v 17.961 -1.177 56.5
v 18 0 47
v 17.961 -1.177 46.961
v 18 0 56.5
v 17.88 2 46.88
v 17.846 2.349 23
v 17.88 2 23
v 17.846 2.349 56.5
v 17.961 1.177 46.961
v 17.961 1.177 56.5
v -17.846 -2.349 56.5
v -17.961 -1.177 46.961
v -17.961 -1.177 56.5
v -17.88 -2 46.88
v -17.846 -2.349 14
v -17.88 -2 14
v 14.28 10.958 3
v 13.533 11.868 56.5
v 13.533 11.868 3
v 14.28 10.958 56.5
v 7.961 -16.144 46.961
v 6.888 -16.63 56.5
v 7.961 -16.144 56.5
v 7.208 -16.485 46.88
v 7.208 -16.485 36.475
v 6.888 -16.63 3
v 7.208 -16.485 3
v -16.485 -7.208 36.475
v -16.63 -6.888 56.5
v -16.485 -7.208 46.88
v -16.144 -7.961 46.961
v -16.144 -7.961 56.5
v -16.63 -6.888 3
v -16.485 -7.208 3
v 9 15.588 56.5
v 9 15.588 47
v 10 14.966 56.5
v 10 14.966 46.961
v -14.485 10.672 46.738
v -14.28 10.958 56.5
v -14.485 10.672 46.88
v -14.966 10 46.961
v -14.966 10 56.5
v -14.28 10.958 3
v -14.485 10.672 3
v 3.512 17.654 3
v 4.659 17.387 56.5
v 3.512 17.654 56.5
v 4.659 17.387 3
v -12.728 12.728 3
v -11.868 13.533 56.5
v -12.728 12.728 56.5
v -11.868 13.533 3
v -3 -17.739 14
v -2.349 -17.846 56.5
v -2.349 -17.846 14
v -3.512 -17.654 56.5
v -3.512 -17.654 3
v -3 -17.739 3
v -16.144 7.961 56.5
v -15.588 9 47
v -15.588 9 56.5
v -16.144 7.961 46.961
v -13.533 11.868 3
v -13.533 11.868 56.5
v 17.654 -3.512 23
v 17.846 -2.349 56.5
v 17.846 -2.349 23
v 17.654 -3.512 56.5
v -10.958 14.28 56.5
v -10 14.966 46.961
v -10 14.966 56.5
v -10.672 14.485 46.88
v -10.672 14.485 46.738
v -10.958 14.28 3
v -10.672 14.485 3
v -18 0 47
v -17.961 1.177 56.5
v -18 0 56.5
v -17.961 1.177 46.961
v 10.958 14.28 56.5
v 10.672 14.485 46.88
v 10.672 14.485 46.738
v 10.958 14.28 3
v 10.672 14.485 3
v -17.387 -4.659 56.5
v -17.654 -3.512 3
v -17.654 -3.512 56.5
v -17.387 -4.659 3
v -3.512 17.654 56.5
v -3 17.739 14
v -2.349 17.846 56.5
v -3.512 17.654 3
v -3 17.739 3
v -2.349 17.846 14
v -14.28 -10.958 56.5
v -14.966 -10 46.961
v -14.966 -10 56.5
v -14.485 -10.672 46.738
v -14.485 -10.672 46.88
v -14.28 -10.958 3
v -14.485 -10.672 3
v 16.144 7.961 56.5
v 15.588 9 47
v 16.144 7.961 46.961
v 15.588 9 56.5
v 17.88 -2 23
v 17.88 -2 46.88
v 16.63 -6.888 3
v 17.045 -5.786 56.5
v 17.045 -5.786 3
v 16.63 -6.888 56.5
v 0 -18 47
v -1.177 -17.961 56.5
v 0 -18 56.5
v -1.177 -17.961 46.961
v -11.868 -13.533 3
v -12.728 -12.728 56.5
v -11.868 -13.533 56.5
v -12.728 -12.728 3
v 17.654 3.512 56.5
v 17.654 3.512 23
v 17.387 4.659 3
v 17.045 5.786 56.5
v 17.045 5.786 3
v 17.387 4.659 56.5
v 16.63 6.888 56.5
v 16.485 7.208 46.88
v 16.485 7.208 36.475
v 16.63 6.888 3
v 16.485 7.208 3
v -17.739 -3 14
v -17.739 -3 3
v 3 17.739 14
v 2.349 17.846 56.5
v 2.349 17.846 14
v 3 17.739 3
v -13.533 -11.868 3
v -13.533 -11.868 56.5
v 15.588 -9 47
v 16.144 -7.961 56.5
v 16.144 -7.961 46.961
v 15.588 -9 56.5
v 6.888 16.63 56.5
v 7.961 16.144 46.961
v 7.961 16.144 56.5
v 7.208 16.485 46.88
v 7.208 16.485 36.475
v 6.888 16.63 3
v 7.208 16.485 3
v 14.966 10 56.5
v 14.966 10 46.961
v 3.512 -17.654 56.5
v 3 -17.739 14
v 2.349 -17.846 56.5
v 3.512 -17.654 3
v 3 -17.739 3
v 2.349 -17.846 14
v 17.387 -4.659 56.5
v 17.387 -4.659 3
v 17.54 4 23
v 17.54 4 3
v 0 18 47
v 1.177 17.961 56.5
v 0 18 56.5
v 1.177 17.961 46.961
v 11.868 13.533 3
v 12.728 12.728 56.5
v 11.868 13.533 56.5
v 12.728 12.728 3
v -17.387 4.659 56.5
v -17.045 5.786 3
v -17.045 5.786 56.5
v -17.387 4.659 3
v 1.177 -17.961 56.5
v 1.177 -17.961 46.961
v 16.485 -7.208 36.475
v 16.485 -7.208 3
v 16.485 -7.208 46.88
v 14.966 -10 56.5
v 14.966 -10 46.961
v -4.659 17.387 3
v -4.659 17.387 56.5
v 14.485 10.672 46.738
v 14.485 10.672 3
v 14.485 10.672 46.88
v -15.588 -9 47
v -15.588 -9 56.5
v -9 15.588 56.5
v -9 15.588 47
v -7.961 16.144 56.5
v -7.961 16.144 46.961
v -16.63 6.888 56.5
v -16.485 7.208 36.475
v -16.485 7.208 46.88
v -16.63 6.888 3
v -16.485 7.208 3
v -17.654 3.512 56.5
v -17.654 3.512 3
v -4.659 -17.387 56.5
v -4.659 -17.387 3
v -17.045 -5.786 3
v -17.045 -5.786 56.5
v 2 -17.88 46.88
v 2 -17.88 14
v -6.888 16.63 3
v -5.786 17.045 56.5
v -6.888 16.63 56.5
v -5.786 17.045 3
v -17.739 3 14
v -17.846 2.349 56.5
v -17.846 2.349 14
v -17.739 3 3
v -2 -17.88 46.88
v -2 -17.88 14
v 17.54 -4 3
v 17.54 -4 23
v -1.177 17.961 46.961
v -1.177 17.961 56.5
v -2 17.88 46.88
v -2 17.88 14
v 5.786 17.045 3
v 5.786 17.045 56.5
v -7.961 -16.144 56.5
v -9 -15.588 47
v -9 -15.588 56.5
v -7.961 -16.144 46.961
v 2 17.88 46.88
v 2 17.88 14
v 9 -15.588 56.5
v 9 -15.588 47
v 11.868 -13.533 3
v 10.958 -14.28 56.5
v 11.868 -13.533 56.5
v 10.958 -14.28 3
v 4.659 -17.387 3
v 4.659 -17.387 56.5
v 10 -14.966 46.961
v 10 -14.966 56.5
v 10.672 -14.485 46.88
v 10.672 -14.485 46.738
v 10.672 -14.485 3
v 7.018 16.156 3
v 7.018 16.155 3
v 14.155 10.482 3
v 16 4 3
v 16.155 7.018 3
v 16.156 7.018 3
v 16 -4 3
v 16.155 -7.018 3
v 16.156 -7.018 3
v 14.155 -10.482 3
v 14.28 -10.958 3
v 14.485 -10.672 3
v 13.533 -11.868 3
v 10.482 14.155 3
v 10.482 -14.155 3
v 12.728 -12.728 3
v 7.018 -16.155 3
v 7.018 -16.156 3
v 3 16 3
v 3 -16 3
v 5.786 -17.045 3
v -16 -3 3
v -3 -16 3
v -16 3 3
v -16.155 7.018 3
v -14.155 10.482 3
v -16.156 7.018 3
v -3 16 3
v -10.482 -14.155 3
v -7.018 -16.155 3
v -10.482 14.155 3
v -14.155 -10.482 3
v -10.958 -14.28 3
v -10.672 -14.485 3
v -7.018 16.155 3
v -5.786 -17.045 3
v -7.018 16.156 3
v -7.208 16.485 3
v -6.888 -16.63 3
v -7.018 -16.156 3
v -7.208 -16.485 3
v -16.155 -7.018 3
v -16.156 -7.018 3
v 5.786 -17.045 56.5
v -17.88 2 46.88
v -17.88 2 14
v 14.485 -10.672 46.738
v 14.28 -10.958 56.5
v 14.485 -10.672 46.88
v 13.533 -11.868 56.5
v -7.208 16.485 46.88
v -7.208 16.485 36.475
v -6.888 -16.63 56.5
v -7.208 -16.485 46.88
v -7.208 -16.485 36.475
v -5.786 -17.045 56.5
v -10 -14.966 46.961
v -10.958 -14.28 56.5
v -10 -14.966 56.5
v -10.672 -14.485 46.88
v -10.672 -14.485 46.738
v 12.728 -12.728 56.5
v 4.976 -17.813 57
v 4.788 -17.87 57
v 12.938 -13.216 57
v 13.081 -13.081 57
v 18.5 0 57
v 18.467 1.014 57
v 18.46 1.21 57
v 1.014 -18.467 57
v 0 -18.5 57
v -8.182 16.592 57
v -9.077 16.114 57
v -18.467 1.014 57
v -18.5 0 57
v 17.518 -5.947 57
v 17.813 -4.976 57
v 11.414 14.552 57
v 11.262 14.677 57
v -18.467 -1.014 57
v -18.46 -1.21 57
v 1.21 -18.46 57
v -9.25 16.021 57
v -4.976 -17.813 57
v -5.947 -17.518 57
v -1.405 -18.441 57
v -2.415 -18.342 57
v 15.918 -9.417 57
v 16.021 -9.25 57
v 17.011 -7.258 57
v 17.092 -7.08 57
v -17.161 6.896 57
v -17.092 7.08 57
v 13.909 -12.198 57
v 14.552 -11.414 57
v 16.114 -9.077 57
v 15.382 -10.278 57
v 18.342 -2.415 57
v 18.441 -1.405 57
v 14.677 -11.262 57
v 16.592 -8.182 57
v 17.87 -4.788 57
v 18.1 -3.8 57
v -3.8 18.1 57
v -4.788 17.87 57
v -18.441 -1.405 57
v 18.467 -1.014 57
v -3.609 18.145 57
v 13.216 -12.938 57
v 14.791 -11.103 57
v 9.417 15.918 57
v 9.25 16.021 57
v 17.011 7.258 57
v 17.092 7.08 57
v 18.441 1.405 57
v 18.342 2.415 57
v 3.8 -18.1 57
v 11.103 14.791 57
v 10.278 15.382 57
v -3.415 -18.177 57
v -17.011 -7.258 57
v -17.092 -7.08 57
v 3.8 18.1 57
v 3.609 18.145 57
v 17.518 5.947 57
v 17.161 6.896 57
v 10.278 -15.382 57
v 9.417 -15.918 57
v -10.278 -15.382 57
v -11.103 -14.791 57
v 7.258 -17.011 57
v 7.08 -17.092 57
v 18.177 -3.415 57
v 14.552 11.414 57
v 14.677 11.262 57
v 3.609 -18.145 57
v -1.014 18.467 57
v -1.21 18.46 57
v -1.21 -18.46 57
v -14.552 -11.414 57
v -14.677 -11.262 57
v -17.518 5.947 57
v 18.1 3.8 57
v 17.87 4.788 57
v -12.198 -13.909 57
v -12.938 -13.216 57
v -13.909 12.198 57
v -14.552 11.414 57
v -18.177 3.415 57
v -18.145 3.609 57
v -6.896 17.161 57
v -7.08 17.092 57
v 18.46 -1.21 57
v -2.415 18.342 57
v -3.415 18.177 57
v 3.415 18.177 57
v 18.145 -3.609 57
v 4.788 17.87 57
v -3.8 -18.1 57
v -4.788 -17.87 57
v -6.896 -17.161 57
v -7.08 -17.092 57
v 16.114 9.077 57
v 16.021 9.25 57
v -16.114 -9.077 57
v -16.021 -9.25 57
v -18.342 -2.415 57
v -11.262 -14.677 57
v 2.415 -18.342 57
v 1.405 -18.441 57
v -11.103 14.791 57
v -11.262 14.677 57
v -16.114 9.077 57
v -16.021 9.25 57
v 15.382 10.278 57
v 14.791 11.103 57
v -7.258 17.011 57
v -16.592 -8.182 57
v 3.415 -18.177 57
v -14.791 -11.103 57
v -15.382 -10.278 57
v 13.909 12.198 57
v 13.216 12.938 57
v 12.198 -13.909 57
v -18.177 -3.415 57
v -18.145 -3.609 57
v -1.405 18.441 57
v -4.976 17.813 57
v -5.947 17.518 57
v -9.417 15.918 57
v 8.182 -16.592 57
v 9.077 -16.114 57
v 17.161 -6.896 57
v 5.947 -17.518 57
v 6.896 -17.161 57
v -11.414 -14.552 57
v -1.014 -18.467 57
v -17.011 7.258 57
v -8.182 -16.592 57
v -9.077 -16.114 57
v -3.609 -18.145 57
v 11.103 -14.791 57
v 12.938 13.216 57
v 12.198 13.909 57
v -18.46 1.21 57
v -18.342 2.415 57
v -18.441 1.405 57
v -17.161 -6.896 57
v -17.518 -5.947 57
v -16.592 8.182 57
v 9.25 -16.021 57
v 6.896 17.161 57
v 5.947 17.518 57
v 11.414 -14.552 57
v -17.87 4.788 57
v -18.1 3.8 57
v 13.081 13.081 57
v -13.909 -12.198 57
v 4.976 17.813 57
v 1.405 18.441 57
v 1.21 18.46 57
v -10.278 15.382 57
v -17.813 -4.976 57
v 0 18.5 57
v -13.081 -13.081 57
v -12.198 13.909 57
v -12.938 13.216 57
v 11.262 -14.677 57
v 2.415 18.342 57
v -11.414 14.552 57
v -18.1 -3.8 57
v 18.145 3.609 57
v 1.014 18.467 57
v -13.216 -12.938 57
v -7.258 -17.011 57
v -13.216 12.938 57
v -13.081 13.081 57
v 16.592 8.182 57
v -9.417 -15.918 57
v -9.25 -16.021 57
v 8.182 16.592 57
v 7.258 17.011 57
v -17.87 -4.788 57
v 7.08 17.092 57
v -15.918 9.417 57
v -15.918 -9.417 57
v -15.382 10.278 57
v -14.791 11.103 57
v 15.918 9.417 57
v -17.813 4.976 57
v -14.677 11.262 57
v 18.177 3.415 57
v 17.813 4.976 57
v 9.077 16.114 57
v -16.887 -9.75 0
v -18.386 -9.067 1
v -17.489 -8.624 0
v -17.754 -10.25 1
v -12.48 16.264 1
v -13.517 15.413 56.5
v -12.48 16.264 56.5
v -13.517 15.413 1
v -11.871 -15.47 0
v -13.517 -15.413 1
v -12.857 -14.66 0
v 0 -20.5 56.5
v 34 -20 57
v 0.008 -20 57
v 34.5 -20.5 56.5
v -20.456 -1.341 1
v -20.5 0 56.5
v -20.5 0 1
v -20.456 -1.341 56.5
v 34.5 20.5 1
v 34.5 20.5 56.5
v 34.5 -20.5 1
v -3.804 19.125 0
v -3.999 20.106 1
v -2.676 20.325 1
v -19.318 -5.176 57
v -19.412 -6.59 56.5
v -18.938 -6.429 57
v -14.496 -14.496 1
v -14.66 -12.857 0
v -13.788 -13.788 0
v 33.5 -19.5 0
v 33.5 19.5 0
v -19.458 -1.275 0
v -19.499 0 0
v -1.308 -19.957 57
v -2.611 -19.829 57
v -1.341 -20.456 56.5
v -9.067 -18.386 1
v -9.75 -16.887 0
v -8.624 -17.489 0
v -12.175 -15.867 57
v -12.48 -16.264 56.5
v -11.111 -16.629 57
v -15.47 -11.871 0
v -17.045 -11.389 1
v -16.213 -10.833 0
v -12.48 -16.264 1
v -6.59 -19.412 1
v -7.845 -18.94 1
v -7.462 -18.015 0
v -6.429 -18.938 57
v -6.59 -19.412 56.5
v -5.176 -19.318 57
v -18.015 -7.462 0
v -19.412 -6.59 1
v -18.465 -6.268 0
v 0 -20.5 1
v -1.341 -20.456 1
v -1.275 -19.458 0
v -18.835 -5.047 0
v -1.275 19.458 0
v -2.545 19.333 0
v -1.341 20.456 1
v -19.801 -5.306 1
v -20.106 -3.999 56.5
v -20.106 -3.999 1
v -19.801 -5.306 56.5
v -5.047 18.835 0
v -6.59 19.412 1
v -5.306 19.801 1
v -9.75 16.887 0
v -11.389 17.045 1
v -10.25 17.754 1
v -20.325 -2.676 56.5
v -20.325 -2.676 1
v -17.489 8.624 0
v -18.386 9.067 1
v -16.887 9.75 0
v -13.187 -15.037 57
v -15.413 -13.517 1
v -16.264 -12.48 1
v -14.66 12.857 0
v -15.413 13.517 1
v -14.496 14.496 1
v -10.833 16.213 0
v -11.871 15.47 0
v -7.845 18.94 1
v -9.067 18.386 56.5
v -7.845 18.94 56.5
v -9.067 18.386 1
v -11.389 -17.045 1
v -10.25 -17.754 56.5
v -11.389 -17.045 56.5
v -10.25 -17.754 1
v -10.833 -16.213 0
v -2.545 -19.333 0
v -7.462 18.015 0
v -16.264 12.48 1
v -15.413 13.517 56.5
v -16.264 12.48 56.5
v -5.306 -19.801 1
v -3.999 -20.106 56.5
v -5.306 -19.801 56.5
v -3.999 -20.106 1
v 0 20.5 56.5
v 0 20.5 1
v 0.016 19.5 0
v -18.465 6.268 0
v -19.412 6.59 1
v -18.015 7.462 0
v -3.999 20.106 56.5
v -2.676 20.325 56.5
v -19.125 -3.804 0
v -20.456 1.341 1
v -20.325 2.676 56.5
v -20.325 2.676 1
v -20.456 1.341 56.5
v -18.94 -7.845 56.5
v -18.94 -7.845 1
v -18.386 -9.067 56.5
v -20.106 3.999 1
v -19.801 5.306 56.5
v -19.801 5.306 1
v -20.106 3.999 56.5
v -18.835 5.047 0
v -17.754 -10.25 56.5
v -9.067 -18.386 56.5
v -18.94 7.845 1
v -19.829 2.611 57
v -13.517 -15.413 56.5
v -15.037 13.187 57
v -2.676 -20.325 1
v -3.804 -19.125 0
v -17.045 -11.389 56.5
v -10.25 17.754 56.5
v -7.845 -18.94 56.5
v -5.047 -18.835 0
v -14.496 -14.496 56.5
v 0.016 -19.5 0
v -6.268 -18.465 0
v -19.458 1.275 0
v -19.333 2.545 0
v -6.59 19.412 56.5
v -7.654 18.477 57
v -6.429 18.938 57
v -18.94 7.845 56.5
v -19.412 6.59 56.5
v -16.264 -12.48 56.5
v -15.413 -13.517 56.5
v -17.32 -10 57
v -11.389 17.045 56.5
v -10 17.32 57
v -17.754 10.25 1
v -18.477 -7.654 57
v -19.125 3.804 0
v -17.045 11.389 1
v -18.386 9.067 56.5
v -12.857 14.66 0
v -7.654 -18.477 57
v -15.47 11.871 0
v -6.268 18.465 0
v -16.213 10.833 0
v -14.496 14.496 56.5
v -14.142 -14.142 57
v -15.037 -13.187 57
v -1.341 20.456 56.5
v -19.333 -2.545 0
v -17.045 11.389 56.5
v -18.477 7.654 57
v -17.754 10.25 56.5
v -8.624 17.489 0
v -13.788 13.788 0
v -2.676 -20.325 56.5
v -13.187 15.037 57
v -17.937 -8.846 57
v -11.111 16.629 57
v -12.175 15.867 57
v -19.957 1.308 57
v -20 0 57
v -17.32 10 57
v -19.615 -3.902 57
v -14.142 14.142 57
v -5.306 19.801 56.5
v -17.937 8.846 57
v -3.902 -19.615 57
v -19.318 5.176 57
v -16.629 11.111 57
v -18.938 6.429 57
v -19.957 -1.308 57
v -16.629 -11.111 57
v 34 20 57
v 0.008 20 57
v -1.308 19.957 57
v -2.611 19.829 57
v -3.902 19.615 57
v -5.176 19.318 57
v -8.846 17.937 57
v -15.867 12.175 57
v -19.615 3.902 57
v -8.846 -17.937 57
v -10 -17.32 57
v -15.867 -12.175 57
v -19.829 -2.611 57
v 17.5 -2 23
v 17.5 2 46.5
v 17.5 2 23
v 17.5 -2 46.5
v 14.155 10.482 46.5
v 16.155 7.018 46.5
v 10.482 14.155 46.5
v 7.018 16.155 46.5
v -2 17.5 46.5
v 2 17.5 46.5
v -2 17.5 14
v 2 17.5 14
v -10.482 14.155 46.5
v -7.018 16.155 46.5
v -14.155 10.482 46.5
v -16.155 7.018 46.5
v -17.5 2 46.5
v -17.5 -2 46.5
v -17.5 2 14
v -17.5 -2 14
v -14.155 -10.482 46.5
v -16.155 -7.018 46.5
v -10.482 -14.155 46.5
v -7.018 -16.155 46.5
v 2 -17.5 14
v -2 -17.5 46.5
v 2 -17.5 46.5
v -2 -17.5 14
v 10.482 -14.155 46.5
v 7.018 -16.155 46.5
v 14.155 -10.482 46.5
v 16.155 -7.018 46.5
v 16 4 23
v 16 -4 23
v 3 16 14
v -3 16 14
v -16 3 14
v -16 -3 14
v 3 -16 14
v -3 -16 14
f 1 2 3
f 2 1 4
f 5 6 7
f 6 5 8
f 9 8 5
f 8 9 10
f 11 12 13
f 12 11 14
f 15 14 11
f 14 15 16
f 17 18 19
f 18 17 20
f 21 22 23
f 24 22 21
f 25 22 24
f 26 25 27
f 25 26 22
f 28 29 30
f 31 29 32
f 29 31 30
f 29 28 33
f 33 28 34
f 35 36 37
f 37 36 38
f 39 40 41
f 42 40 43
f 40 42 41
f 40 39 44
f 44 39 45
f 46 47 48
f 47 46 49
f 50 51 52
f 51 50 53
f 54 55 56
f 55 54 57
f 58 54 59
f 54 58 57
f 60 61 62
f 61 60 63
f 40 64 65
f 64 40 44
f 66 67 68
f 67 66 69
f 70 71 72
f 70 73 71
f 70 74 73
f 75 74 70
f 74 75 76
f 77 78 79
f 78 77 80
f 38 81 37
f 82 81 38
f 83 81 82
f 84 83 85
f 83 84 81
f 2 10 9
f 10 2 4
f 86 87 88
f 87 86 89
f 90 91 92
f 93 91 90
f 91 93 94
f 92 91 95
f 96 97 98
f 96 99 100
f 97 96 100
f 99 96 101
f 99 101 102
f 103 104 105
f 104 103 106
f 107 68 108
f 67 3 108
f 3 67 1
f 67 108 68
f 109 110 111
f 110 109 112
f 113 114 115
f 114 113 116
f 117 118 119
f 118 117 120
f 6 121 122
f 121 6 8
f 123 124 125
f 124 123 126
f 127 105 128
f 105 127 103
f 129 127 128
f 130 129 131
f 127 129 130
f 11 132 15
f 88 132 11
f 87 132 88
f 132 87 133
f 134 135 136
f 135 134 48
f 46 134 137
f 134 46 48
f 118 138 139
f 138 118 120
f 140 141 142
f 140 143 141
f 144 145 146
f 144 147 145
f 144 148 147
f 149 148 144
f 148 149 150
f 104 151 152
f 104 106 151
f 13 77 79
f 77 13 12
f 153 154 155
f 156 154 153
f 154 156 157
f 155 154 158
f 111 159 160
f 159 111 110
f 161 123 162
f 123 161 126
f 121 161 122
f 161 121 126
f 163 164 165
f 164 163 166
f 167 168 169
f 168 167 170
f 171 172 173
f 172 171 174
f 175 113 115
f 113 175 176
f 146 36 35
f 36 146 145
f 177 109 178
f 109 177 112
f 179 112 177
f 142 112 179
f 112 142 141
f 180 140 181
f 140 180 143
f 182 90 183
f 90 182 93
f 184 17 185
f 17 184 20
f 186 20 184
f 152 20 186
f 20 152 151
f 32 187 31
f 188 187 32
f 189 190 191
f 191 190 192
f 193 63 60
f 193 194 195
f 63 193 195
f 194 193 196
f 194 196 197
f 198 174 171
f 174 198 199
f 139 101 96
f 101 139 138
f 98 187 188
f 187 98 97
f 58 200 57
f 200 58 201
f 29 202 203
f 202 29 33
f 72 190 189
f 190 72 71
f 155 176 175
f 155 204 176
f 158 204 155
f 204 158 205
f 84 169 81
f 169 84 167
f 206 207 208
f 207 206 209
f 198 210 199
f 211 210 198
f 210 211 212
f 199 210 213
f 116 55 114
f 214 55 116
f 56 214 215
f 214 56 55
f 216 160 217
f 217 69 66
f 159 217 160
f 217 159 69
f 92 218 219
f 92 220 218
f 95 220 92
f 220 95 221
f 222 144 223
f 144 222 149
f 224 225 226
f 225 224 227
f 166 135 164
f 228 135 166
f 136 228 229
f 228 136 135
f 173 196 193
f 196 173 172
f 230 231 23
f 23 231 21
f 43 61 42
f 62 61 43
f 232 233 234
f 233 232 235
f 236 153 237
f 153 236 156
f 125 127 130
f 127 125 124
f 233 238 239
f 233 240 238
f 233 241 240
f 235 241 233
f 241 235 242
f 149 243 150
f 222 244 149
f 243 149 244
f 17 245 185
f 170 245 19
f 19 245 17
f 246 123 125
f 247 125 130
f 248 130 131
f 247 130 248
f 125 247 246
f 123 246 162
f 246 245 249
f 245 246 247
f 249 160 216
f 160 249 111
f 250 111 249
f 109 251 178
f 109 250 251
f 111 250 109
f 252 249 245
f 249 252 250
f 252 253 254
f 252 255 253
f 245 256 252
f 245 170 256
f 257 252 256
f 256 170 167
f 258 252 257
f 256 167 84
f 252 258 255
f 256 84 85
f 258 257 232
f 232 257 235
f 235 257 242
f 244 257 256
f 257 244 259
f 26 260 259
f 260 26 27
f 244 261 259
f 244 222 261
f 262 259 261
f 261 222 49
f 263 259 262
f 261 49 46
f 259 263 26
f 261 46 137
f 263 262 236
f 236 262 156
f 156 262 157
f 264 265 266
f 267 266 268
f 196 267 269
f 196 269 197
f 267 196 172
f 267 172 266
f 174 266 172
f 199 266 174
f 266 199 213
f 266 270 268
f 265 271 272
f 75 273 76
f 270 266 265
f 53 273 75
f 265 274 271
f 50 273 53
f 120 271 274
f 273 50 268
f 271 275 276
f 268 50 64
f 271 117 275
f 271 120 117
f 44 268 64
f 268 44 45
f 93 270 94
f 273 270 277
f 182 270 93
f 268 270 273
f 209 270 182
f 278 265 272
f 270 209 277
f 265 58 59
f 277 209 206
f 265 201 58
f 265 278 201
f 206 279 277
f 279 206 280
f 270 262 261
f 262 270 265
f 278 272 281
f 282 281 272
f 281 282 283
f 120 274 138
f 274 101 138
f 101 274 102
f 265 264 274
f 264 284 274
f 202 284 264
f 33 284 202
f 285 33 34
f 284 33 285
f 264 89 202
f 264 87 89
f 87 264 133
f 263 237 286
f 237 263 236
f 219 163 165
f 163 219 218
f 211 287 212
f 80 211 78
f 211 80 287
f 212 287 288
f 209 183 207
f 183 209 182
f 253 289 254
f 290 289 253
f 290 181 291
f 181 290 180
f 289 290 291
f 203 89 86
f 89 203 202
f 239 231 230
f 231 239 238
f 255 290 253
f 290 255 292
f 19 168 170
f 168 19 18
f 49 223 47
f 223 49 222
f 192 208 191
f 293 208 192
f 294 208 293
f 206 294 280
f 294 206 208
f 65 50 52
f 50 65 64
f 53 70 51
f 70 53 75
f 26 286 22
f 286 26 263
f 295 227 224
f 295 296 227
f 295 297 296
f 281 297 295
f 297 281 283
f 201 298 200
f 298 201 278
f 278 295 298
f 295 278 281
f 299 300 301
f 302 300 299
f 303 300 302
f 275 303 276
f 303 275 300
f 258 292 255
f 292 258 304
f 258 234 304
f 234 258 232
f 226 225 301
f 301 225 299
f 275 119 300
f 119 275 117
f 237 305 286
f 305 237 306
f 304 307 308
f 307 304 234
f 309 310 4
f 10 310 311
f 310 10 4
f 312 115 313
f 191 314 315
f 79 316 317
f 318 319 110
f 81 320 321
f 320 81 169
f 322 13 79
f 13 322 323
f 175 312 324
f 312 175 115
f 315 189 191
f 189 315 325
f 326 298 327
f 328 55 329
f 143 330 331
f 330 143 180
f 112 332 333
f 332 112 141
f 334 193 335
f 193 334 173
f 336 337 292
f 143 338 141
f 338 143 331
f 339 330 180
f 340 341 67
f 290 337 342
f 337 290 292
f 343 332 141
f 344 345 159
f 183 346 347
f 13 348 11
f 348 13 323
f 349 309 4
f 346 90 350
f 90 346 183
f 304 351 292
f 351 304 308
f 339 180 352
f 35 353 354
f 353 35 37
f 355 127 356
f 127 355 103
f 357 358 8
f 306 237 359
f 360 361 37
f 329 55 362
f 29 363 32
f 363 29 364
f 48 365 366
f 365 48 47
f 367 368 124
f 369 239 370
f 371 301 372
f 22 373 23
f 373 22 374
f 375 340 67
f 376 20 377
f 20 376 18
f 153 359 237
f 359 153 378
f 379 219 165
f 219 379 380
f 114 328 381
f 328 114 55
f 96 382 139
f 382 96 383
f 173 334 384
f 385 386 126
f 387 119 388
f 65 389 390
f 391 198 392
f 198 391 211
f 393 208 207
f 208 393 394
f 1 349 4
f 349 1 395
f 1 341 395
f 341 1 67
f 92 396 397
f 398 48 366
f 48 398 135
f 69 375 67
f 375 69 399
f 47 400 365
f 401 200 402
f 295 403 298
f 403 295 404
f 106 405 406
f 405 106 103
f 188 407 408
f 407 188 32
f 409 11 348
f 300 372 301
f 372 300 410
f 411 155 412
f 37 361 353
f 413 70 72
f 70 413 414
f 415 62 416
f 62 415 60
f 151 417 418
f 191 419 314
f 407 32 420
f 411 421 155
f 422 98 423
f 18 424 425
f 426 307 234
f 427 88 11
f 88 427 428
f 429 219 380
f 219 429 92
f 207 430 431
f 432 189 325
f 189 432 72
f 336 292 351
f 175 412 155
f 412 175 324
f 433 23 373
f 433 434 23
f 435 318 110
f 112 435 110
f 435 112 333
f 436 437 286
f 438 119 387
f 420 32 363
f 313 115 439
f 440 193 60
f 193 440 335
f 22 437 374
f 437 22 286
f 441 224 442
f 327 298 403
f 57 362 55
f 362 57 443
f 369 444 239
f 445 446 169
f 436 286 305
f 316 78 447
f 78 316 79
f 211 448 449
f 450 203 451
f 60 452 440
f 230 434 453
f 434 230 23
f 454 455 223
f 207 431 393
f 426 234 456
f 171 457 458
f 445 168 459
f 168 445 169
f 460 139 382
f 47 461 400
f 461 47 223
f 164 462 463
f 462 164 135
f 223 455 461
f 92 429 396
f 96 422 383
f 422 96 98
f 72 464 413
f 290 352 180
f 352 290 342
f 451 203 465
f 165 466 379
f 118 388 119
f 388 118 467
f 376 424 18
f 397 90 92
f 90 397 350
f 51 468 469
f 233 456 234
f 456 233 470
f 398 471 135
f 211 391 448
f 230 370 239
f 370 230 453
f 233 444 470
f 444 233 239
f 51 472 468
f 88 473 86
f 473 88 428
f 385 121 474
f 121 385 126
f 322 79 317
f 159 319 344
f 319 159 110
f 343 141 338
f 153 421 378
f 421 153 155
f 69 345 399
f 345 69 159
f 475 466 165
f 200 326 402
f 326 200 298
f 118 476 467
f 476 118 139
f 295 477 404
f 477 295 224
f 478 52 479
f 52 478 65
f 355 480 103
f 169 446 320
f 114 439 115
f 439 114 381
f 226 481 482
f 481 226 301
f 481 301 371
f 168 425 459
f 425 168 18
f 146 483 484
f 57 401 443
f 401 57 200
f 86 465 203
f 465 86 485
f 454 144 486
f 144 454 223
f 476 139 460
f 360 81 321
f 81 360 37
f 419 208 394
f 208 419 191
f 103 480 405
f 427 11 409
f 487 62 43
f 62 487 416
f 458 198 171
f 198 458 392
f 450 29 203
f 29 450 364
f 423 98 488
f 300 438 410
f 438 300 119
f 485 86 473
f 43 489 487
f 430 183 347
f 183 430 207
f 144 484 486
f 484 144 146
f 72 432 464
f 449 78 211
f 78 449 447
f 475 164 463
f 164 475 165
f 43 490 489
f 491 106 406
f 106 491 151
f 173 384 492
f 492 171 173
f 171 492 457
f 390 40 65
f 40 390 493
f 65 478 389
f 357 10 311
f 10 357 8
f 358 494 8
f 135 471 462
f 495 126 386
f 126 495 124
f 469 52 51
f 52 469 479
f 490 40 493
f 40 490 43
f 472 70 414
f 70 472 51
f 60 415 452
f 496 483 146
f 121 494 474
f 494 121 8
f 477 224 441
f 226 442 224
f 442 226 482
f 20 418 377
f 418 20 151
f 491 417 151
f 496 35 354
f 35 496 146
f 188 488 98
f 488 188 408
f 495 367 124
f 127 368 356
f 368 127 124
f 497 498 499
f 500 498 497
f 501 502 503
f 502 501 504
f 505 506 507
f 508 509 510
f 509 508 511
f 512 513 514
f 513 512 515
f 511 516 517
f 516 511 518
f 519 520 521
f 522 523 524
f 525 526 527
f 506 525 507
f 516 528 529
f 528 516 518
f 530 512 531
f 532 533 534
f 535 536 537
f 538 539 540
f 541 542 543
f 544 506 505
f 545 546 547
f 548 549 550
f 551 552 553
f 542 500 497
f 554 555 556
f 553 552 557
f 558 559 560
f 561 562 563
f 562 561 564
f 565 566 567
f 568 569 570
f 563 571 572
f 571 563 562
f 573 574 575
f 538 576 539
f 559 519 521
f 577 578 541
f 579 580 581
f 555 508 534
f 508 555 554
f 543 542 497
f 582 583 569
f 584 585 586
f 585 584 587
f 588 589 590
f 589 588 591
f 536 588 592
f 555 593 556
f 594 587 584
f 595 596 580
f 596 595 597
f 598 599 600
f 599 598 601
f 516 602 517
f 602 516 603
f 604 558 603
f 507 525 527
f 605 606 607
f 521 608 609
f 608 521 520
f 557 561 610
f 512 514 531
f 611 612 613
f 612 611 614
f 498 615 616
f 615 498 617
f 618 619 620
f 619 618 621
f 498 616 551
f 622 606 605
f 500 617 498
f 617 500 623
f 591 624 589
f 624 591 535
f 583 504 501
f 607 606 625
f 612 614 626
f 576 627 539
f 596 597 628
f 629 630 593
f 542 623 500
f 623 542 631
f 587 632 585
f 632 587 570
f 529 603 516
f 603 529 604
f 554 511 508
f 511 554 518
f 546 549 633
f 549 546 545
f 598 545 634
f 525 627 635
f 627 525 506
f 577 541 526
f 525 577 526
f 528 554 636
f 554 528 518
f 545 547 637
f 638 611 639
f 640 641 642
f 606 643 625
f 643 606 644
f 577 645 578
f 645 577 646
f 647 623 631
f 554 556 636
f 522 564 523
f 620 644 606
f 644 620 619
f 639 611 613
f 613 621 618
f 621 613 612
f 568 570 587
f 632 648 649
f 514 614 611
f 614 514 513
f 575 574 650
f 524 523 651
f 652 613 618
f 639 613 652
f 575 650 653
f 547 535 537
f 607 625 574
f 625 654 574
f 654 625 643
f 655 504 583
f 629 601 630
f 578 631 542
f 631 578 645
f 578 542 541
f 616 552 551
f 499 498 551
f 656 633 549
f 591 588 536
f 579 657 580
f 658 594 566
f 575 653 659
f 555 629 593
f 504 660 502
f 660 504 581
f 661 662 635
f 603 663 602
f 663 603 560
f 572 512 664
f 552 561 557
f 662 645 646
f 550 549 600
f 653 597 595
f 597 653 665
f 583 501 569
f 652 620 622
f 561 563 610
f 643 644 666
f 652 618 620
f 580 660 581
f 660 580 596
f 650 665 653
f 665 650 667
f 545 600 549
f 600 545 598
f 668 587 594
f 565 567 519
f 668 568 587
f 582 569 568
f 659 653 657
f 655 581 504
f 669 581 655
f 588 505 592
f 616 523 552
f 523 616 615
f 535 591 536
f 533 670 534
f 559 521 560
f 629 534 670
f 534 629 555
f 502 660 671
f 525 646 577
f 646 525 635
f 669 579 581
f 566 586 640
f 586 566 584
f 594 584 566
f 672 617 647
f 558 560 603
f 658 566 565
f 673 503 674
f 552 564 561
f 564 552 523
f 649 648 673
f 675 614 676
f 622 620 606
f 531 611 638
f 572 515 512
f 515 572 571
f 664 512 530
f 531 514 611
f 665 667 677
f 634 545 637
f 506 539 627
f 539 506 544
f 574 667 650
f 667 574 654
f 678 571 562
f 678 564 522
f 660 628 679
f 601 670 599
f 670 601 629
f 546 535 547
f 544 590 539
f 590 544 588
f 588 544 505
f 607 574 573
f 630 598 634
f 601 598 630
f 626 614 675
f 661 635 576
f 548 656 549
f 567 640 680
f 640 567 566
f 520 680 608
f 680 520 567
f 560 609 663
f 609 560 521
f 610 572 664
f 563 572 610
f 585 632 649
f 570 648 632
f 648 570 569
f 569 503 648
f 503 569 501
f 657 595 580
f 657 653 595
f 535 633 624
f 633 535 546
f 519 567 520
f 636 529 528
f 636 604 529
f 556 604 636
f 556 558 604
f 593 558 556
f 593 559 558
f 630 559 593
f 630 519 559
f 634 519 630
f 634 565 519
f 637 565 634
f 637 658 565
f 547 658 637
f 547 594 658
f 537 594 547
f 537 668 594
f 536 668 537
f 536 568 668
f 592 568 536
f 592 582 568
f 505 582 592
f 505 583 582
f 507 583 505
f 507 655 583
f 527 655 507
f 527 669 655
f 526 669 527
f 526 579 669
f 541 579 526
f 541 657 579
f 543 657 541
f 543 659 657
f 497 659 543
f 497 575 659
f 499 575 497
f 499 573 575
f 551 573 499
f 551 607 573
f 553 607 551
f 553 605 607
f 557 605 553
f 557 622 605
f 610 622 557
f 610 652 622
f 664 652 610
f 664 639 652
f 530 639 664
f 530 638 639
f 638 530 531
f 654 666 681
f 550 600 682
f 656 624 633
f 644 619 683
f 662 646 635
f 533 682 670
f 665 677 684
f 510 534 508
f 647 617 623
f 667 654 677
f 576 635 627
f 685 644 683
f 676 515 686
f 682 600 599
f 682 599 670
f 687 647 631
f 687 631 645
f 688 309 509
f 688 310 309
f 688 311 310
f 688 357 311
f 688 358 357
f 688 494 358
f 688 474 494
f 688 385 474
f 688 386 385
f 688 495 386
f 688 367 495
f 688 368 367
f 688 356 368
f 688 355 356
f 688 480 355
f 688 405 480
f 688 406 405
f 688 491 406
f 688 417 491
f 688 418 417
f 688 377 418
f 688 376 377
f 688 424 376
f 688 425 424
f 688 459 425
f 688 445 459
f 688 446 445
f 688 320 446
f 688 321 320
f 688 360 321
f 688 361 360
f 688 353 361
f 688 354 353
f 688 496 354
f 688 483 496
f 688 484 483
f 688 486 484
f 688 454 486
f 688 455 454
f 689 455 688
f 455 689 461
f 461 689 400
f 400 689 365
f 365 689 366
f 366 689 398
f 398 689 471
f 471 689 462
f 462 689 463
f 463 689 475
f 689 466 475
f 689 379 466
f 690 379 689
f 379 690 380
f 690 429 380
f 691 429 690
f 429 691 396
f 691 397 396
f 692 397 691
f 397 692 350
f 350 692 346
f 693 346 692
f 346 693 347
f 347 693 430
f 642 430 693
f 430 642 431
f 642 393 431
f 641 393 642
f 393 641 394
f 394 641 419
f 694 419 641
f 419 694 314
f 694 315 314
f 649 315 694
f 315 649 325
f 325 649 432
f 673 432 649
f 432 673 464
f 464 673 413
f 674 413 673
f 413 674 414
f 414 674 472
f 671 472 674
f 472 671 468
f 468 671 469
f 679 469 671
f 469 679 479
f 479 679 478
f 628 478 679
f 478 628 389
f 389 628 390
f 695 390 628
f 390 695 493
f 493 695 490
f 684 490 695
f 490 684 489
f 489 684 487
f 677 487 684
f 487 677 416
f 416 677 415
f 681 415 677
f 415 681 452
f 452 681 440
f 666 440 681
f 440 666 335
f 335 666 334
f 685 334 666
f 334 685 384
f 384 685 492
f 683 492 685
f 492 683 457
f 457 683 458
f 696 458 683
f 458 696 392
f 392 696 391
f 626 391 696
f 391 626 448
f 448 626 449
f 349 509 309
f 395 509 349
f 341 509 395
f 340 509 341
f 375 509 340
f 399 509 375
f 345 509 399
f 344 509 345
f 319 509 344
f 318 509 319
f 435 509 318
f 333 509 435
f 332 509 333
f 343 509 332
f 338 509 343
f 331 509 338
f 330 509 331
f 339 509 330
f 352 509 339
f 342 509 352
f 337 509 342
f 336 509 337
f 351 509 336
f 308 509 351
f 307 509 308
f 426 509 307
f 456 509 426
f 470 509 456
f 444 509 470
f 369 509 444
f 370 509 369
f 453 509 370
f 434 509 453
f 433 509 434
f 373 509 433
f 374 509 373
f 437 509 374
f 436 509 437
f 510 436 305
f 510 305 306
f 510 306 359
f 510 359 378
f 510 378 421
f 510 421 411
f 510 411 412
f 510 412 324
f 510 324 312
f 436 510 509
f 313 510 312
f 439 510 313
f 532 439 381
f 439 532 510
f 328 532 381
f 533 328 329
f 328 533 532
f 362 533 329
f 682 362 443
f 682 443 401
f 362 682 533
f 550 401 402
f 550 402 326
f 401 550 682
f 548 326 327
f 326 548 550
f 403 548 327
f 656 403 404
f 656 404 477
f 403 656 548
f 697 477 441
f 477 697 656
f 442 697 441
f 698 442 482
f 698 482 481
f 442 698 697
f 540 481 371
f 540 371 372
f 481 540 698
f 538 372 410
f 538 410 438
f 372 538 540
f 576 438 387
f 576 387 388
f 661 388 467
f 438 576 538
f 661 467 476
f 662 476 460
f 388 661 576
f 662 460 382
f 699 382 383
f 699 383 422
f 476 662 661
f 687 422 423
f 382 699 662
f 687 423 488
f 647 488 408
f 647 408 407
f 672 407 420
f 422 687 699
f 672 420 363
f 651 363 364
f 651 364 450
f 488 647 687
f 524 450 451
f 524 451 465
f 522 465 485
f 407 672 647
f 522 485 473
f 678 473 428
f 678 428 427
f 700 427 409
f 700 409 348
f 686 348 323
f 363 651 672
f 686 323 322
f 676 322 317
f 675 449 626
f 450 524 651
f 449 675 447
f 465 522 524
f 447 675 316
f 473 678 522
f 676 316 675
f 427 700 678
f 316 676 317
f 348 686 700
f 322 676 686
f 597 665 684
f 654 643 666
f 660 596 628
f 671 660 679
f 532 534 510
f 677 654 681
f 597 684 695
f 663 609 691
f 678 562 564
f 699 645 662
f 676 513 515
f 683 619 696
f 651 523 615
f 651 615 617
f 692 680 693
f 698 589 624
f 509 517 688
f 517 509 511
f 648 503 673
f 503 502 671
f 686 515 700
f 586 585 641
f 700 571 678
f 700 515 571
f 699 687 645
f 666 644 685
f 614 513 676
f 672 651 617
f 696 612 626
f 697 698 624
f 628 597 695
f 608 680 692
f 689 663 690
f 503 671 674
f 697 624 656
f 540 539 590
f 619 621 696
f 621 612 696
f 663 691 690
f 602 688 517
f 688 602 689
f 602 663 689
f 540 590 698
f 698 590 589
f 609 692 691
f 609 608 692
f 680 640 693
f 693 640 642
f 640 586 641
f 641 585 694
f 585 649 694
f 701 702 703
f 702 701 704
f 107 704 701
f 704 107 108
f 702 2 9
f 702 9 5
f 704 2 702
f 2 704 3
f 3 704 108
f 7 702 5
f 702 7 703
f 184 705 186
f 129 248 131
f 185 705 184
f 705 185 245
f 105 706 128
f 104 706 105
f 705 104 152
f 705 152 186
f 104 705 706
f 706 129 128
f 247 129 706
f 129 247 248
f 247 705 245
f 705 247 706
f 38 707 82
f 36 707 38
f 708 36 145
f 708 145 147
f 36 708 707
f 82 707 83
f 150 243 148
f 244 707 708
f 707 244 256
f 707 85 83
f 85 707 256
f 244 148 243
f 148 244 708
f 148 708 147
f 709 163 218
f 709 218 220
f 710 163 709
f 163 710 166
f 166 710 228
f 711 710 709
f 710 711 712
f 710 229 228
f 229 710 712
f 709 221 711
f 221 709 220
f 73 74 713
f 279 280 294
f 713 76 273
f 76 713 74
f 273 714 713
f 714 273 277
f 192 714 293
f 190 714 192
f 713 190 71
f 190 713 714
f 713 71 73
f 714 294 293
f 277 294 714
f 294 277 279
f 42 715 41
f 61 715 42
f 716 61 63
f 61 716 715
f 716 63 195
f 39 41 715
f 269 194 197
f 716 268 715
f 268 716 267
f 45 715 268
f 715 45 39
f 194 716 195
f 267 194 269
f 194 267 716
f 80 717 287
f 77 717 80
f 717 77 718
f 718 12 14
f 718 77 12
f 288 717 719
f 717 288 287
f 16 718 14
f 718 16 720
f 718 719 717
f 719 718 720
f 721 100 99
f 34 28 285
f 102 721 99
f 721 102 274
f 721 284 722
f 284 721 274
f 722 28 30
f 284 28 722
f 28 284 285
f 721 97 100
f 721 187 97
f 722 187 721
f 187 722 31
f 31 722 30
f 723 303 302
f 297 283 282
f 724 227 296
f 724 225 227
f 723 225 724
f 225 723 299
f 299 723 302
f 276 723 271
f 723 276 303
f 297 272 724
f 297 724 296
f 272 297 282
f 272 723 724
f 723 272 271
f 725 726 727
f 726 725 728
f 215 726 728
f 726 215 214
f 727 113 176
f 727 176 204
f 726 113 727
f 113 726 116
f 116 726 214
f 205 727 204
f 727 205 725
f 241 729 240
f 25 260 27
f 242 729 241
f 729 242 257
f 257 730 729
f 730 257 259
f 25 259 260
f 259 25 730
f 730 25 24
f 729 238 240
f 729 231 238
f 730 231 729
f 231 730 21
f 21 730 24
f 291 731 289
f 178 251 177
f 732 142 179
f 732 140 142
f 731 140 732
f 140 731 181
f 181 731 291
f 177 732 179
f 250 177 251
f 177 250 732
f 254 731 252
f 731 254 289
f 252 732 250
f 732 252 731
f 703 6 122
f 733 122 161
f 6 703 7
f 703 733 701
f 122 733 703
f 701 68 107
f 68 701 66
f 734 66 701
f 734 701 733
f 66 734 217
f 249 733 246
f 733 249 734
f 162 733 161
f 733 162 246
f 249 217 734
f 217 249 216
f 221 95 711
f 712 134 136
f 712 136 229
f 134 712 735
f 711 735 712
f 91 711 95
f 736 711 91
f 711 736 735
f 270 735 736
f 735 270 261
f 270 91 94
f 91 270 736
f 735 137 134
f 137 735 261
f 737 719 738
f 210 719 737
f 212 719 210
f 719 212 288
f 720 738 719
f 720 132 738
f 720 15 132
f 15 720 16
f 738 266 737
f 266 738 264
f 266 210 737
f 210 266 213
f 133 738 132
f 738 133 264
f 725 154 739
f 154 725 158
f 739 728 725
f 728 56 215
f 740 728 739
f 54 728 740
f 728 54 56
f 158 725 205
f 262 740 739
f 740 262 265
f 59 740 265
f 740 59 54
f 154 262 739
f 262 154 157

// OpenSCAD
// =====================================================================
// tischfuss_rohrkappe
// Zweck: Tischfuss als einseitig geschlossene Kappe zum Aufstecken auf
//        ein Rundrohr mit ca. 35 bis 36 mm Durchmesser.
//        Grundflaeche D-foermig: Halbkreis (D 41 mm) auf der einen Seite,
//        rechteckige, massive Verlaengerung auf der Gegenseite.
//        Innen 12 Klemmrippen (Presspassung) und 4 radiale Bodenrippen
//        als Anschlag fuer das Rohrende.
//
// Masse:
//   Aussenhoehe                      57 mm
//   Aussentiefe (X)                  55 mm
//   Aussenbreite (Y)                 41 mm
//   Bodenstaerke                      3 mm
//   Bohrung                          D 36 mm, koaxial zum Halbkreis
//   Bohrungstiefe                    54 mm (abgeleitet)
//   Wandstaerke Rundseite            2,5 mm (abgeleitet)
//   Verlaengerung ab Bohrungsachse   34,5 mm (abgeleitet)
//   Klemmrippen                      12 Stk, 30 Grad Teilung, 4 mm breit,
//                                    0,5 mm radial, freier Innen-D 35 mm,
//                                    von 10 mm unter Oberkante bis Boden
//                                    (Laenge 44 mm), oben 45-Grad-Anlauf
//   Bodenrippen                      4 Stk, 90 Grad Teilung, 2 mm lang,
//                                    6 mm breit, 11 mm hoch; Ausnahme Rippe zur
//                                    Rechteckseite (+X): 2 mm lang, 8 mm breit,
//                                    20 mm hoch
//   Einfuehrfase Bohrung             0,5 mm x 45 Grad
//   Fase Aussenkante unten           1 mm x 45 Grad
//   Fase Aussenkante oben            0,5 mm x 45 Grad
//
// Koordinaten: Bohrungsachse = Z-Achse, Halbkreis auf -X-Seite,
//              Verlaengerung in +X. Boden liegt auf z = 0.
// Druck: Boden auf dem Druckbett, Oeffnung nach oben, ABS, Prusa Core One.
// =====================================================================

// ---------------- Parameter ----------------
hoehe             = 57;    // Aussenhoehe in mm
tiefe             = 55;    // Aussentiefe inklusive rechteckiger Verlaengerung in mm
breite            = 41;    // Aussenbreite = Durchmesser der Rundseite in mm
boden             = 3;     // Bodenstaerke in mm
bohrung_d         = 36;    // Bohrungsdurchmesser in mm
einfuehr_tiefe    = 10;    // Glatter Bereich ohne Rippen unter der Oberkante in mm
rippe_anzahl      = 12;    // Anzahl der Klemmrippen
rippe_b           = 4;     // Breite einer Klemmrippe in mm
rippe_h           = 0.5;   // Radialer Ueberstand einer Klemmrippe in mm
bodenrippe_anzahl = 4;     // Anzahl der Bodenrippen
bodenrippe_l      = 2;    // Radiale Laenge einer Bodenrippe in mm
bodenrippe_b      = 6;     // Breite einer Bodenrippe in mm
bodenrippe_h      = 11;     // Hoehe einer Bodenrippe in mm
bodenrippe_u_l    = 2;    // Radiale Laenge der Bodenrippe zur Rechteckseite (+X) in mm
bodenrippe_u_b    = 8;     // Breite der Bodenrippe zur Rechteckseite (+X) in mm
bodenrippe_u_h    = 20;    // Hoehe der Bodenrippe zur Rechteckseite (+X) in mm

bohr_fase         = 0.5;   // Einfuehrfase an der Bohrungsoberkante in mm (45 Grad)
fase_unten        = 1;     // Fase der Aussenkante an der Grundflaeche in mm (45 Grad)
fase_oben         = 0.5;   // Fase der Aussenkante an der Oberseite in mm (45 Grad)

einbett           = 0.3;   // Einbettung der Rippen in die Wand in mm
ueberlapp         = 0.01;  // Ueberlappung gegen Kantenberuehrung in mm
eps               = 0.1;   // Ueberstand von Abzugskoerpern in mm

// ---------------- Abgeleitete Masse ----------------
r_aussen       = breite / 2;                 // Radius Rundseite: 20.5 mm
bohrung_r      = bohrung_d / 2;              // Bohrungsradius: 18 mm
verl           = tiefe - r_aussen;           // Verlaengerung ab Achse: 34.5 mm
rippe_r_innen  = bohrung_r - rippe_h;        // Innenradius ueber Klemmrippen: 17.5 mm
rippe_z_oben   = hoehe - einfuehr_tiefe;     // Oberkante Klemmrippen: 47 mm
wand_r         = bohrung_r + einbett;        // Aussenende der Rippen in der Wand

// Pruefung der Fertigungsauflage
assert(rippe_h >= 0.4, "Klemmrippen-Ueberstand muss mindestens 0,4 mm betragen");

// ---------------- Aufloesung ----------------
$fn = 96;

// ---------------- Module ----------------

// 2D-Grundflaeche in D-Form: Halbkreis um den Ursprung plus Rechteck in +X
module d_form() {
    union() {
        circle(r = r_aussen);
        translate([0, -r_aussen]) square([verl, breite]);
    }
}

// Aussenkoerper mit Fasen unten und oben (D-Form ist konvex, daher hull exakt)
module aussenkoerper() {
    hull() {
        // untere Fasenkante
        linear_extrude(height = ueberlapp)
            offset(delta = -fase_unten) d_form();
        // voller Querschnitt
        translate([0, 0, fase_unten])
            linear_extrude(height = hoehe - fase_unten - fase_oben)
                d_form();
        // obere Fasenkante
        translate([0, 0, hoehe - ueberlapp])
            linear_extrude(height = ueberlapp)
                offset(delta = -fase_oben) d_form();
    }
}

// Bohrung von oben bis auf den Boden, mit Einfuehrfase an der Oberkante
module bohrung() {
    translate([0, 0, boden])
        cylinder(h = hoehe - boden + eps, r = bohrung_r);
    translate([0, 0, hoehe - bohr_fase])
        cylinder(h = bohr_fase + eps, r1 = bohrung_r, r2 = bohrung_r + bohr_fase + eps);
}

// Eine Klemmrippe in +X-Richtung, Profil in der XZ-Ebene mit 45-Grad-Anlauf oben
module klemmrippe() {
    rotate([90, 0, 0])
        linear_extrude(height = rippe_b, center = true)
            polygon([
                [rippe_r_innen, boden - ueberlapp],
                [wand_r,        boden - ueberlapp],
                [wand_r,        rippe_z_oben],
                [bohrung_r,     rippe_z_oben],
                [rippe_r_innen, rippe_z_oben - rippe_h]
            ]);
}

// Alle Klemmrippen gleichmaessig verteilt
module klemmrippen() {
    for (i = [0 : rippe_anzahl - 1])
        rotate([0, 0, i * 360 / rippe_anzahl])
            klemmrippe();
}

// Eine Bodenrippe in +X-Richtung, von der Bohrungswand radial nach innen
module bodenrippe(l, b, h) {
    r_i = bohrung_r - l;   // Innenende der Rippe (negativ = ueber die Achse hinaus)
    translate([r_i, -b / 2, boden - ueberlapp])
        cube([wand_r - r_i, b, h + ueberlapp]);
}

// Alle Bodenrippen gleichmaessig verteilt; die zur Rechteckseite (+X, 0 Grad) ist groesser
module bodenrippen() {
    for (i = [0 : bodenrippe_anzahl - 1]) {
        w = i * 360 / bodenrippe_anzahl;
        rotate([0, 0, w])
            if (w == 0)   bodenrippe(bodenrippe_u_l, bodenrippe_u_b, bodenrippe_u_h);
            else          bodenrippe(bodenrippe_l, bodenrippe_b, bodenrippe_h);
    }
}

// Hauptmodul: Kappe mit Bohrung, Klemmrippen und Bodenrippen
module tischfuss_rohrkappe() {
    union() {
        difference() {
            aussenkoerper();
            bohrung();
        }
        klemmrippen();
        bodenrippen();
    }
}

// ---------------- Aufruf ----------------
tischfuss_rohrkappe();
